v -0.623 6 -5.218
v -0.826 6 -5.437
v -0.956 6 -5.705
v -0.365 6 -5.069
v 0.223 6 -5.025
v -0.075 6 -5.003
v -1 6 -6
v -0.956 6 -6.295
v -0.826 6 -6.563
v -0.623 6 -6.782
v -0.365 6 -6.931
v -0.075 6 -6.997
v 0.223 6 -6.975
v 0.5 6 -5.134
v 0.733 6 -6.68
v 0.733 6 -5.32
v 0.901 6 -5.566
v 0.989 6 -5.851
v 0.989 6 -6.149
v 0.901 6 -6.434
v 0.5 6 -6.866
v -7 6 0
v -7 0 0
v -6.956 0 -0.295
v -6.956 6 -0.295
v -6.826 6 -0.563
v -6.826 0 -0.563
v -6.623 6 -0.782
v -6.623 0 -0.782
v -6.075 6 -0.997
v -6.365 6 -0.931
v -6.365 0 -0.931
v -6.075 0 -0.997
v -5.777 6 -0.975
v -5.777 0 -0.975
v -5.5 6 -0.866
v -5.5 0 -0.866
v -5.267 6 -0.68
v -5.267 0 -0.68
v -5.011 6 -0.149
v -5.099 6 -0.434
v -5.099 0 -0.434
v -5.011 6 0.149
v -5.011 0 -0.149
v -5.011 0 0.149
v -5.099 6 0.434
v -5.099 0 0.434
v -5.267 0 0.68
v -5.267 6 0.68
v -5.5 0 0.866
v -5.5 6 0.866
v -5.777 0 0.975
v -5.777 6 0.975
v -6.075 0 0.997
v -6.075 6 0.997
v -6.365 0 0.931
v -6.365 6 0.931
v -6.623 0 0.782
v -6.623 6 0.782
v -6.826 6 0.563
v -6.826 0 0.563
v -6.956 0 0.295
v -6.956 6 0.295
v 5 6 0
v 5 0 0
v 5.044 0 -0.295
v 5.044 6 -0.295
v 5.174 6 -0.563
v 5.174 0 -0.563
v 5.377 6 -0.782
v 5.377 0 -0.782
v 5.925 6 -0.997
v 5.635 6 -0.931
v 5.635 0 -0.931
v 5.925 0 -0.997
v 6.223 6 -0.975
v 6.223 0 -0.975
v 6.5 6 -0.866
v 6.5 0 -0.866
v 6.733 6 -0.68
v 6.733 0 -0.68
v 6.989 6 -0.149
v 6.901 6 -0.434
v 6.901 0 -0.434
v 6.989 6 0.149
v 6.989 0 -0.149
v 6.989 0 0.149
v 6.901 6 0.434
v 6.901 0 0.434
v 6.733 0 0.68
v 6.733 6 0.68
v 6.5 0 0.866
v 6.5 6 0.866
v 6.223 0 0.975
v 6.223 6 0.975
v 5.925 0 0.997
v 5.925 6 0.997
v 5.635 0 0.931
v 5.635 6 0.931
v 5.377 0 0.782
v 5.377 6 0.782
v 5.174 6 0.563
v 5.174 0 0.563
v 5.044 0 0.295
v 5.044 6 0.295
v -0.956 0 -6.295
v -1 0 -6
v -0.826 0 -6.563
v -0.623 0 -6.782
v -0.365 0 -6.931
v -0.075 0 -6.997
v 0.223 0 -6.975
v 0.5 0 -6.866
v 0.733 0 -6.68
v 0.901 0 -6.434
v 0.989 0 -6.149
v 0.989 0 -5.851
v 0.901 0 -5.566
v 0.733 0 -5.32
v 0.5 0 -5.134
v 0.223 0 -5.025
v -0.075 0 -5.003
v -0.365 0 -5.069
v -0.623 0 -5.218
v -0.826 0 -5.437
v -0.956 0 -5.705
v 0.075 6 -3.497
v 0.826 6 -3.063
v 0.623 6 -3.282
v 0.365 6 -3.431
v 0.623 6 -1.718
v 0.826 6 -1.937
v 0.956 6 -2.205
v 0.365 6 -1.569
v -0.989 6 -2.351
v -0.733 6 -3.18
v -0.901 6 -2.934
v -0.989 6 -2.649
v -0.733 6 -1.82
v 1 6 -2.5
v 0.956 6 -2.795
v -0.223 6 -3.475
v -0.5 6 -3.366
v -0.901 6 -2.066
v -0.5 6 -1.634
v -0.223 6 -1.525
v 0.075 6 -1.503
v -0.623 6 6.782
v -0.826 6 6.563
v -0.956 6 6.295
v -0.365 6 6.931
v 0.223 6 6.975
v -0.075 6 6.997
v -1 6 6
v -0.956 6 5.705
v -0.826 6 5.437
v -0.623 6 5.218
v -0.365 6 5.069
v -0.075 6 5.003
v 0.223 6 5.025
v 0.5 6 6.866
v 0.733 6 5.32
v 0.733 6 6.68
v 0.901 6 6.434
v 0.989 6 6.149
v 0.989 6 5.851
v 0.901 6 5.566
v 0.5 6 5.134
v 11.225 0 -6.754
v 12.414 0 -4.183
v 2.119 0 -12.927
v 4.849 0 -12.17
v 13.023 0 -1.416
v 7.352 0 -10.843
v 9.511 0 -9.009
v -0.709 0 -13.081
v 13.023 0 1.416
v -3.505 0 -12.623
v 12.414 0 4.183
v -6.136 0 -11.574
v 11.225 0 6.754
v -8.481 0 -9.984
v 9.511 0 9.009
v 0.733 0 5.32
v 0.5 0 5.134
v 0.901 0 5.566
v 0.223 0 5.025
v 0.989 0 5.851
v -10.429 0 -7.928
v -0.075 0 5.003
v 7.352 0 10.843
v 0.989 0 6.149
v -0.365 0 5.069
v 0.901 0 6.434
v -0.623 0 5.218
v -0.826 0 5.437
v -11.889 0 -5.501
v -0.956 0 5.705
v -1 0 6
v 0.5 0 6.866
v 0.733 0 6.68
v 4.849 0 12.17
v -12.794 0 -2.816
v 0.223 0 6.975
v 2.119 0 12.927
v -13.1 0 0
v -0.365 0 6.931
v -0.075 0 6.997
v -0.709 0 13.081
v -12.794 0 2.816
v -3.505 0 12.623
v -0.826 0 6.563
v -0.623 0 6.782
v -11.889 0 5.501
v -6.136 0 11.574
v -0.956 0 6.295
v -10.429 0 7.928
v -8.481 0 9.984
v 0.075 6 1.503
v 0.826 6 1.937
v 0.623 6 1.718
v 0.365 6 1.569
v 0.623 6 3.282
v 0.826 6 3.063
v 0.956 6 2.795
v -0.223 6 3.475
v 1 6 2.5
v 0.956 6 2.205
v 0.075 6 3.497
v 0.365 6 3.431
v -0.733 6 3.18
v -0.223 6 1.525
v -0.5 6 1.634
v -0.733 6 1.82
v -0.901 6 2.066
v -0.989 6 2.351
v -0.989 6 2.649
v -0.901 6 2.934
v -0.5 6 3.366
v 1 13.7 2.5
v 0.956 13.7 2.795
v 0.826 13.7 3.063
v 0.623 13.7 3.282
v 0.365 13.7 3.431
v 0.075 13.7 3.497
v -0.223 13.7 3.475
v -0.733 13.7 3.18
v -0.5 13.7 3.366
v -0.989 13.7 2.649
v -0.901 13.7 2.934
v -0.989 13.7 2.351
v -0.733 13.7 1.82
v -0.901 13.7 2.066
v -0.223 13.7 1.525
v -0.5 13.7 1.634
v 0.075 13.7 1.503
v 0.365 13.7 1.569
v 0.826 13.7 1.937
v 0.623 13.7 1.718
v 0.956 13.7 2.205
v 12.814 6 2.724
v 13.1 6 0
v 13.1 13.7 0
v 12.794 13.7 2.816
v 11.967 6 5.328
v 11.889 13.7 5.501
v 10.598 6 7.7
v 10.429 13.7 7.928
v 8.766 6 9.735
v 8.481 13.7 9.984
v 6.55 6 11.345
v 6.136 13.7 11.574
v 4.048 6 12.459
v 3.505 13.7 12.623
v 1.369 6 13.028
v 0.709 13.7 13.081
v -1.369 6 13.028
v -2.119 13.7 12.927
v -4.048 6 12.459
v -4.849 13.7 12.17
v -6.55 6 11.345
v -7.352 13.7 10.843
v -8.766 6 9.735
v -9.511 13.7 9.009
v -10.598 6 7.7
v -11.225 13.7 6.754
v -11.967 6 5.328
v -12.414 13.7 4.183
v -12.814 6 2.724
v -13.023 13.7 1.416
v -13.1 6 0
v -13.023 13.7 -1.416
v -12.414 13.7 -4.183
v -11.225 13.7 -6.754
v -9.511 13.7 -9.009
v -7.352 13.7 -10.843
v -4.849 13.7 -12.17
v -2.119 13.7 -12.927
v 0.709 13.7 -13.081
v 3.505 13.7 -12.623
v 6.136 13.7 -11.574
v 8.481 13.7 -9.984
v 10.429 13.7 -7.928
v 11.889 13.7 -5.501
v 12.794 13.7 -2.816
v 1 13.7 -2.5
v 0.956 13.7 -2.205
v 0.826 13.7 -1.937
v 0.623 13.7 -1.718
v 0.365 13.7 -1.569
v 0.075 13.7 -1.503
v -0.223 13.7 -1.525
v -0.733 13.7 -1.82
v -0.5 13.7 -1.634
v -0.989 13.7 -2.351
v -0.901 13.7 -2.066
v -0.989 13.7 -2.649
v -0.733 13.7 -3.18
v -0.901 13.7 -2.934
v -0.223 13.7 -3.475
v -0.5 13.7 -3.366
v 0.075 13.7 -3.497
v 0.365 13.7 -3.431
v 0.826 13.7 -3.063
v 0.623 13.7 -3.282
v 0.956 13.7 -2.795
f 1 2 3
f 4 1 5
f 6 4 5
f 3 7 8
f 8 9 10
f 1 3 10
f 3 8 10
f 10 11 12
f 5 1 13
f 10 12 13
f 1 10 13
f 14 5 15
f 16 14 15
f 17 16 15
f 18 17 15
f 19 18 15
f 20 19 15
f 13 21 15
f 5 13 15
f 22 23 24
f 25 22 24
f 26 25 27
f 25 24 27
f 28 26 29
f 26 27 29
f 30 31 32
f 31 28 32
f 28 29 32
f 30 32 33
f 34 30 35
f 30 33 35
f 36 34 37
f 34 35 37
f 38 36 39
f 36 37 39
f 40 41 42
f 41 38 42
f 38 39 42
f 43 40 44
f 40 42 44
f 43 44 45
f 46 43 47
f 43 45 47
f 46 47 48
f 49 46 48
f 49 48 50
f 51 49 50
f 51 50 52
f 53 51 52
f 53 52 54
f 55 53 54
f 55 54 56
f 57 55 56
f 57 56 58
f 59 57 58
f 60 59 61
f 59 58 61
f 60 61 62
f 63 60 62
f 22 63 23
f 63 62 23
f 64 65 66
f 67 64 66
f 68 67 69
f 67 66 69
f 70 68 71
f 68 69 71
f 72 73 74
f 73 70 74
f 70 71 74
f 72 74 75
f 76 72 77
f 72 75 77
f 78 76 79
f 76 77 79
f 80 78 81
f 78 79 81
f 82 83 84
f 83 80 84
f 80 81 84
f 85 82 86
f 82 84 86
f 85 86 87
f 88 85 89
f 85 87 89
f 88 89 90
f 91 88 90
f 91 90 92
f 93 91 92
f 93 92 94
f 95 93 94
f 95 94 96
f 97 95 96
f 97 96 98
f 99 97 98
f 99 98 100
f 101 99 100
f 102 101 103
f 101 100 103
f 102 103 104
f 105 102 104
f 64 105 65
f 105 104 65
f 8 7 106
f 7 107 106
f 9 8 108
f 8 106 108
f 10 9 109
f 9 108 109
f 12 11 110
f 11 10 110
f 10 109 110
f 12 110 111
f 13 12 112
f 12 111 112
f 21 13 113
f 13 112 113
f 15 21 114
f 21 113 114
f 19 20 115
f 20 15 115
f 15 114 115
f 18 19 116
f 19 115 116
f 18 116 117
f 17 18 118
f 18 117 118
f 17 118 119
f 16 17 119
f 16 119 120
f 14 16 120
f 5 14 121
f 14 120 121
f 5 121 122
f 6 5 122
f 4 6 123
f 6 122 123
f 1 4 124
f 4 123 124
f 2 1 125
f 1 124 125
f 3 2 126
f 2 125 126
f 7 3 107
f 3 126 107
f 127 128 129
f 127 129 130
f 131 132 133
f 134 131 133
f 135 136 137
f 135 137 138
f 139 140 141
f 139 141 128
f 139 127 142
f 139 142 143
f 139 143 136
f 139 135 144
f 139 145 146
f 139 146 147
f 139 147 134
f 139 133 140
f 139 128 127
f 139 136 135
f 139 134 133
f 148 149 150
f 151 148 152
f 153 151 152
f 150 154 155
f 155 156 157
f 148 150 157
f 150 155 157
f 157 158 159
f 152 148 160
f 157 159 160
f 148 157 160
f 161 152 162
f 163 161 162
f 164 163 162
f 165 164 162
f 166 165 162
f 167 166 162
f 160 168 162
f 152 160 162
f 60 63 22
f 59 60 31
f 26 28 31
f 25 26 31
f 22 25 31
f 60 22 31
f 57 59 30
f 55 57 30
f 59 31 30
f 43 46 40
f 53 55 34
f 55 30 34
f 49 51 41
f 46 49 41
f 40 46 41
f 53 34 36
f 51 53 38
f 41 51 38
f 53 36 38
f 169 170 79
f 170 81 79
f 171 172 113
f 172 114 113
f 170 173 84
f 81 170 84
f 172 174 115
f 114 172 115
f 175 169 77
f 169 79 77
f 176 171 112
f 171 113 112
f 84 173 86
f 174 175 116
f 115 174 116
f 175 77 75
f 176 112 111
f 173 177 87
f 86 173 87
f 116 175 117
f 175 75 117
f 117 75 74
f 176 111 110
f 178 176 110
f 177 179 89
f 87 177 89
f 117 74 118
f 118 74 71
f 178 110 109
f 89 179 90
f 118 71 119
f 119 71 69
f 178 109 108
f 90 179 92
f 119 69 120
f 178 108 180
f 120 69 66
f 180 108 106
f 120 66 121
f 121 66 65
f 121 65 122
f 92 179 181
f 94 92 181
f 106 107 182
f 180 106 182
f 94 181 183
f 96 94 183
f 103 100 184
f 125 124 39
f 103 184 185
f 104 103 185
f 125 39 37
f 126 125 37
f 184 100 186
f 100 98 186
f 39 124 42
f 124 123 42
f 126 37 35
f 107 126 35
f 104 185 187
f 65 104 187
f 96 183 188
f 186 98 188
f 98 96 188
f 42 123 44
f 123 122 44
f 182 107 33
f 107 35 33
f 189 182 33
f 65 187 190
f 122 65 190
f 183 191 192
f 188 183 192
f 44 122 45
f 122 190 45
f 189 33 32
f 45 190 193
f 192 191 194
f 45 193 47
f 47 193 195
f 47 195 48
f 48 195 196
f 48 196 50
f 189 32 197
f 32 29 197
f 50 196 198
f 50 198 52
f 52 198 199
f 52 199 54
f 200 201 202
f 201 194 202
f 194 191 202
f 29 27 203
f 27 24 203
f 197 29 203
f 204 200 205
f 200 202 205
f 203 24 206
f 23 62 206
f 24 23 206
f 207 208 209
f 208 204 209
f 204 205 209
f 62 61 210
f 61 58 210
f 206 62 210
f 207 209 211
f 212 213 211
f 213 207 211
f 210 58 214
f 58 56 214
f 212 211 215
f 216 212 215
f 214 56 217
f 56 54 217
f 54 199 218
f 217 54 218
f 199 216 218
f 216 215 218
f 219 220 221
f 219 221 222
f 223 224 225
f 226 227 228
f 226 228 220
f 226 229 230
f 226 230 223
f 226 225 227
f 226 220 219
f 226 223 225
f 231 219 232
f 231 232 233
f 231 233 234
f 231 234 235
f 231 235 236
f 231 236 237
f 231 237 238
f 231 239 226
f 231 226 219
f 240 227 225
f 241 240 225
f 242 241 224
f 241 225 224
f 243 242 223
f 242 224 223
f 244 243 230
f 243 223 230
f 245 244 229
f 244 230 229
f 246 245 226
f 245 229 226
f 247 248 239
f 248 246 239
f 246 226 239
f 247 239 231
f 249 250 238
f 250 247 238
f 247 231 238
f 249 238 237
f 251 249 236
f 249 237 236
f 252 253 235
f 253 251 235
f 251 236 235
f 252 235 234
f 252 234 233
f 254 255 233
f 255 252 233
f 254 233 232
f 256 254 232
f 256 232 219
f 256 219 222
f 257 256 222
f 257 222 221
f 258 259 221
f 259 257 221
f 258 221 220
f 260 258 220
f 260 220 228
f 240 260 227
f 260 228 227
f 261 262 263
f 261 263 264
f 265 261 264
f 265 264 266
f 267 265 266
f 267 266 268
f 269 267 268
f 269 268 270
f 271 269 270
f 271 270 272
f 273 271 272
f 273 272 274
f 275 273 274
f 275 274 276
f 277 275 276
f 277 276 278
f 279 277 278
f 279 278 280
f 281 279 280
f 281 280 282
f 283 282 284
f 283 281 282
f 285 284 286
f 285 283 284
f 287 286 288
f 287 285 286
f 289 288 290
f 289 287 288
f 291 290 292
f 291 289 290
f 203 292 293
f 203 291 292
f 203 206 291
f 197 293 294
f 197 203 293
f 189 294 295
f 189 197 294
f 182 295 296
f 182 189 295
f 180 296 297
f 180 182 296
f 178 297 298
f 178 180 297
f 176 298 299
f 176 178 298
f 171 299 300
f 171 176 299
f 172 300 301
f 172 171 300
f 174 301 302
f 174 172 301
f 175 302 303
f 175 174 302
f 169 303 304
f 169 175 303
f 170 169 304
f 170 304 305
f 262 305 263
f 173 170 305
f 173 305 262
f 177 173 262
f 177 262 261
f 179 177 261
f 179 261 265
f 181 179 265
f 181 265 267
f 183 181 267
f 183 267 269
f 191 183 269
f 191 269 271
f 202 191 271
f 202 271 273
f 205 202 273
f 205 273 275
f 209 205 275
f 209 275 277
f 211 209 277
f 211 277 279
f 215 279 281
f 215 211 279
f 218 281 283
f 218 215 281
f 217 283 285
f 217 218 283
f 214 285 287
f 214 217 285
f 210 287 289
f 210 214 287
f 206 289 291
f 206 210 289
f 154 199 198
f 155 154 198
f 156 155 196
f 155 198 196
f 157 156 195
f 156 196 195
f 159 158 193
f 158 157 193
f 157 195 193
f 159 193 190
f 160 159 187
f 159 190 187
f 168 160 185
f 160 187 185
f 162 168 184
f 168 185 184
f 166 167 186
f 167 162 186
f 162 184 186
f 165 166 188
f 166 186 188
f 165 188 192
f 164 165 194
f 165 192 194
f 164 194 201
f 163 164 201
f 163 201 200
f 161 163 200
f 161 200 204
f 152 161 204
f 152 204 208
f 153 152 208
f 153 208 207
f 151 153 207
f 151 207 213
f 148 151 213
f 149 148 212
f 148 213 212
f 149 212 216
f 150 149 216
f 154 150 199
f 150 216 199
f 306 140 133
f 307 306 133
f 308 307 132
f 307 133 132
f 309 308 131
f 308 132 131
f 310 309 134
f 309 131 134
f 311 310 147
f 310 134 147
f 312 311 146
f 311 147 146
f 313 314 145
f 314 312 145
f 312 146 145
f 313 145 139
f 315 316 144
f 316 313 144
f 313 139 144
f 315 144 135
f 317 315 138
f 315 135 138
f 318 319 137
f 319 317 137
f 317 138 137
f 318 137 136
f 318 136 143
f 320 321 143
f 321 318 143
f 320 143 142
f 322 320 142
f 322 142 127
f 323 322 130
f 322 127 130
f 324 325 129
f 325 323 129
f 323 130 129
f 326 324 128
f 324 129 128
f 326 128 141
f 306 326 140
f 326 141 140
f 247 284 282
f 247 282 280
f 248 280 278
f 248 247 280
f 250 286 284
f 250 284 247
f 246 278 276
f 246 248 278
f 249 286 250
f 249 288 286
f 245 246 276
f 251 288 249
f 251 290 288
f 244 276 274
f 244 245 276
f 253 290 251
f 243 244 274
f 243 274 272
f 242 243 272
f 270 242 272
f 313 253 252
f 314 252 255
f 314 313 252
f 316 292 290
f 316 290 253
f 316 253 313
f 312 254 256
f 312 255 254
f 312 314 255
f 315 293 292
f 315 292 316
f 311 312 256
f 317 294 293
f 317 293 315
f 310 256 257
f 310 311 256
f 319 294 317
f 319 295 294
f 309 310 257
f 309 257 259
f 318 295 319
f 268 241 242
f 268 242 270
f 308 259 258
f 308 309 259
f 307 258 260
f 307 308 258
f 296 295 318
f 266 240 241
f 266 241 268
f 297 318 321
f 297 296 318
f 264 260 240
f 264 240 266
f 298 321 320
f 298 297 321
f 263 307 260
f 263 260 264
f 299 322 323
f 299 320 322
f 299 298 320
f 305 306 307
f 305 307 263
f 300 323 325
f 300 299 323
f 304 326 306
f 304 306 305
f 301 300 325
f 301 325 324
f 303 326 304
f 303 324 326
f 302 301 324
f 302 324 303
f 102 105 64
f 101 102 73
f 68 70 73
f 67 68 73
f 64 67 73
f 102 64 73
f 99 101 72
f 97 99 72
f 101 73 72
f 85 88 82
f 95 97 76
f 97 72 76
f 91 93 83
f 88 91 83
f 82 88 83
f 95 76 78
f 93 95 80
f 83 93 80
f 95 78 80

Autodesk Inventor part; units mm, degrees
ref_plane "YZ Plane" through (0, 0, 0) normal (1, 0, 0) x (0, 1, 0)
ref_plane "XZ Plane" through (0, 0, 0) normal (0, 1, 0) x (-1, 0, 0)
ref_plane "XY Plane" through (0, 0, 0) normal (0, 0, 1) x (1, 0, 0)
sketch "Sketch1" plane through (0, 0, 0) normal (0, 1, 0) x (-1, 0, 0)
  circle A0 centre (0, 0) radius 6 construction
  circle A1 centre (6, 0) radius 1
  circle A2 centre (0, 6) radius 1
  circle A3 centre (-6, 0) radius 1
  circle A4 centre (0, -6) radius 1
  circle A5 centre (0, 0) radius 13.1
  dimension "d0" = 12
  dimension "d1" = 2
  dimension "d2" = 2
  dimension "d3" = 2
  dimension "d4" = 2
  dimension "d10" = 26.2
extrude "Extrusion1" add sketch "Sketch1" along normal blind 6
sketch "Sketch2" plane through (0, 6, 0) normal (0, 1, 0) x (1, 0, 0)
  circle A0 centre (0, 0) radius 13.1 projected
  circle A1 centre (0, 0) radius 2.5 construction
  circle A2 centre (0, -2.5) radius 1
  circle A3 centre (0, 2.5) radius 1
  dimension "d7" = 5
  dimension "d8" = 2
  dimension "d9" = 2
extrude "Extrusion2" add sketch "Sketch2" along normal blind 7.7
properties part number "motor_subsitude"
